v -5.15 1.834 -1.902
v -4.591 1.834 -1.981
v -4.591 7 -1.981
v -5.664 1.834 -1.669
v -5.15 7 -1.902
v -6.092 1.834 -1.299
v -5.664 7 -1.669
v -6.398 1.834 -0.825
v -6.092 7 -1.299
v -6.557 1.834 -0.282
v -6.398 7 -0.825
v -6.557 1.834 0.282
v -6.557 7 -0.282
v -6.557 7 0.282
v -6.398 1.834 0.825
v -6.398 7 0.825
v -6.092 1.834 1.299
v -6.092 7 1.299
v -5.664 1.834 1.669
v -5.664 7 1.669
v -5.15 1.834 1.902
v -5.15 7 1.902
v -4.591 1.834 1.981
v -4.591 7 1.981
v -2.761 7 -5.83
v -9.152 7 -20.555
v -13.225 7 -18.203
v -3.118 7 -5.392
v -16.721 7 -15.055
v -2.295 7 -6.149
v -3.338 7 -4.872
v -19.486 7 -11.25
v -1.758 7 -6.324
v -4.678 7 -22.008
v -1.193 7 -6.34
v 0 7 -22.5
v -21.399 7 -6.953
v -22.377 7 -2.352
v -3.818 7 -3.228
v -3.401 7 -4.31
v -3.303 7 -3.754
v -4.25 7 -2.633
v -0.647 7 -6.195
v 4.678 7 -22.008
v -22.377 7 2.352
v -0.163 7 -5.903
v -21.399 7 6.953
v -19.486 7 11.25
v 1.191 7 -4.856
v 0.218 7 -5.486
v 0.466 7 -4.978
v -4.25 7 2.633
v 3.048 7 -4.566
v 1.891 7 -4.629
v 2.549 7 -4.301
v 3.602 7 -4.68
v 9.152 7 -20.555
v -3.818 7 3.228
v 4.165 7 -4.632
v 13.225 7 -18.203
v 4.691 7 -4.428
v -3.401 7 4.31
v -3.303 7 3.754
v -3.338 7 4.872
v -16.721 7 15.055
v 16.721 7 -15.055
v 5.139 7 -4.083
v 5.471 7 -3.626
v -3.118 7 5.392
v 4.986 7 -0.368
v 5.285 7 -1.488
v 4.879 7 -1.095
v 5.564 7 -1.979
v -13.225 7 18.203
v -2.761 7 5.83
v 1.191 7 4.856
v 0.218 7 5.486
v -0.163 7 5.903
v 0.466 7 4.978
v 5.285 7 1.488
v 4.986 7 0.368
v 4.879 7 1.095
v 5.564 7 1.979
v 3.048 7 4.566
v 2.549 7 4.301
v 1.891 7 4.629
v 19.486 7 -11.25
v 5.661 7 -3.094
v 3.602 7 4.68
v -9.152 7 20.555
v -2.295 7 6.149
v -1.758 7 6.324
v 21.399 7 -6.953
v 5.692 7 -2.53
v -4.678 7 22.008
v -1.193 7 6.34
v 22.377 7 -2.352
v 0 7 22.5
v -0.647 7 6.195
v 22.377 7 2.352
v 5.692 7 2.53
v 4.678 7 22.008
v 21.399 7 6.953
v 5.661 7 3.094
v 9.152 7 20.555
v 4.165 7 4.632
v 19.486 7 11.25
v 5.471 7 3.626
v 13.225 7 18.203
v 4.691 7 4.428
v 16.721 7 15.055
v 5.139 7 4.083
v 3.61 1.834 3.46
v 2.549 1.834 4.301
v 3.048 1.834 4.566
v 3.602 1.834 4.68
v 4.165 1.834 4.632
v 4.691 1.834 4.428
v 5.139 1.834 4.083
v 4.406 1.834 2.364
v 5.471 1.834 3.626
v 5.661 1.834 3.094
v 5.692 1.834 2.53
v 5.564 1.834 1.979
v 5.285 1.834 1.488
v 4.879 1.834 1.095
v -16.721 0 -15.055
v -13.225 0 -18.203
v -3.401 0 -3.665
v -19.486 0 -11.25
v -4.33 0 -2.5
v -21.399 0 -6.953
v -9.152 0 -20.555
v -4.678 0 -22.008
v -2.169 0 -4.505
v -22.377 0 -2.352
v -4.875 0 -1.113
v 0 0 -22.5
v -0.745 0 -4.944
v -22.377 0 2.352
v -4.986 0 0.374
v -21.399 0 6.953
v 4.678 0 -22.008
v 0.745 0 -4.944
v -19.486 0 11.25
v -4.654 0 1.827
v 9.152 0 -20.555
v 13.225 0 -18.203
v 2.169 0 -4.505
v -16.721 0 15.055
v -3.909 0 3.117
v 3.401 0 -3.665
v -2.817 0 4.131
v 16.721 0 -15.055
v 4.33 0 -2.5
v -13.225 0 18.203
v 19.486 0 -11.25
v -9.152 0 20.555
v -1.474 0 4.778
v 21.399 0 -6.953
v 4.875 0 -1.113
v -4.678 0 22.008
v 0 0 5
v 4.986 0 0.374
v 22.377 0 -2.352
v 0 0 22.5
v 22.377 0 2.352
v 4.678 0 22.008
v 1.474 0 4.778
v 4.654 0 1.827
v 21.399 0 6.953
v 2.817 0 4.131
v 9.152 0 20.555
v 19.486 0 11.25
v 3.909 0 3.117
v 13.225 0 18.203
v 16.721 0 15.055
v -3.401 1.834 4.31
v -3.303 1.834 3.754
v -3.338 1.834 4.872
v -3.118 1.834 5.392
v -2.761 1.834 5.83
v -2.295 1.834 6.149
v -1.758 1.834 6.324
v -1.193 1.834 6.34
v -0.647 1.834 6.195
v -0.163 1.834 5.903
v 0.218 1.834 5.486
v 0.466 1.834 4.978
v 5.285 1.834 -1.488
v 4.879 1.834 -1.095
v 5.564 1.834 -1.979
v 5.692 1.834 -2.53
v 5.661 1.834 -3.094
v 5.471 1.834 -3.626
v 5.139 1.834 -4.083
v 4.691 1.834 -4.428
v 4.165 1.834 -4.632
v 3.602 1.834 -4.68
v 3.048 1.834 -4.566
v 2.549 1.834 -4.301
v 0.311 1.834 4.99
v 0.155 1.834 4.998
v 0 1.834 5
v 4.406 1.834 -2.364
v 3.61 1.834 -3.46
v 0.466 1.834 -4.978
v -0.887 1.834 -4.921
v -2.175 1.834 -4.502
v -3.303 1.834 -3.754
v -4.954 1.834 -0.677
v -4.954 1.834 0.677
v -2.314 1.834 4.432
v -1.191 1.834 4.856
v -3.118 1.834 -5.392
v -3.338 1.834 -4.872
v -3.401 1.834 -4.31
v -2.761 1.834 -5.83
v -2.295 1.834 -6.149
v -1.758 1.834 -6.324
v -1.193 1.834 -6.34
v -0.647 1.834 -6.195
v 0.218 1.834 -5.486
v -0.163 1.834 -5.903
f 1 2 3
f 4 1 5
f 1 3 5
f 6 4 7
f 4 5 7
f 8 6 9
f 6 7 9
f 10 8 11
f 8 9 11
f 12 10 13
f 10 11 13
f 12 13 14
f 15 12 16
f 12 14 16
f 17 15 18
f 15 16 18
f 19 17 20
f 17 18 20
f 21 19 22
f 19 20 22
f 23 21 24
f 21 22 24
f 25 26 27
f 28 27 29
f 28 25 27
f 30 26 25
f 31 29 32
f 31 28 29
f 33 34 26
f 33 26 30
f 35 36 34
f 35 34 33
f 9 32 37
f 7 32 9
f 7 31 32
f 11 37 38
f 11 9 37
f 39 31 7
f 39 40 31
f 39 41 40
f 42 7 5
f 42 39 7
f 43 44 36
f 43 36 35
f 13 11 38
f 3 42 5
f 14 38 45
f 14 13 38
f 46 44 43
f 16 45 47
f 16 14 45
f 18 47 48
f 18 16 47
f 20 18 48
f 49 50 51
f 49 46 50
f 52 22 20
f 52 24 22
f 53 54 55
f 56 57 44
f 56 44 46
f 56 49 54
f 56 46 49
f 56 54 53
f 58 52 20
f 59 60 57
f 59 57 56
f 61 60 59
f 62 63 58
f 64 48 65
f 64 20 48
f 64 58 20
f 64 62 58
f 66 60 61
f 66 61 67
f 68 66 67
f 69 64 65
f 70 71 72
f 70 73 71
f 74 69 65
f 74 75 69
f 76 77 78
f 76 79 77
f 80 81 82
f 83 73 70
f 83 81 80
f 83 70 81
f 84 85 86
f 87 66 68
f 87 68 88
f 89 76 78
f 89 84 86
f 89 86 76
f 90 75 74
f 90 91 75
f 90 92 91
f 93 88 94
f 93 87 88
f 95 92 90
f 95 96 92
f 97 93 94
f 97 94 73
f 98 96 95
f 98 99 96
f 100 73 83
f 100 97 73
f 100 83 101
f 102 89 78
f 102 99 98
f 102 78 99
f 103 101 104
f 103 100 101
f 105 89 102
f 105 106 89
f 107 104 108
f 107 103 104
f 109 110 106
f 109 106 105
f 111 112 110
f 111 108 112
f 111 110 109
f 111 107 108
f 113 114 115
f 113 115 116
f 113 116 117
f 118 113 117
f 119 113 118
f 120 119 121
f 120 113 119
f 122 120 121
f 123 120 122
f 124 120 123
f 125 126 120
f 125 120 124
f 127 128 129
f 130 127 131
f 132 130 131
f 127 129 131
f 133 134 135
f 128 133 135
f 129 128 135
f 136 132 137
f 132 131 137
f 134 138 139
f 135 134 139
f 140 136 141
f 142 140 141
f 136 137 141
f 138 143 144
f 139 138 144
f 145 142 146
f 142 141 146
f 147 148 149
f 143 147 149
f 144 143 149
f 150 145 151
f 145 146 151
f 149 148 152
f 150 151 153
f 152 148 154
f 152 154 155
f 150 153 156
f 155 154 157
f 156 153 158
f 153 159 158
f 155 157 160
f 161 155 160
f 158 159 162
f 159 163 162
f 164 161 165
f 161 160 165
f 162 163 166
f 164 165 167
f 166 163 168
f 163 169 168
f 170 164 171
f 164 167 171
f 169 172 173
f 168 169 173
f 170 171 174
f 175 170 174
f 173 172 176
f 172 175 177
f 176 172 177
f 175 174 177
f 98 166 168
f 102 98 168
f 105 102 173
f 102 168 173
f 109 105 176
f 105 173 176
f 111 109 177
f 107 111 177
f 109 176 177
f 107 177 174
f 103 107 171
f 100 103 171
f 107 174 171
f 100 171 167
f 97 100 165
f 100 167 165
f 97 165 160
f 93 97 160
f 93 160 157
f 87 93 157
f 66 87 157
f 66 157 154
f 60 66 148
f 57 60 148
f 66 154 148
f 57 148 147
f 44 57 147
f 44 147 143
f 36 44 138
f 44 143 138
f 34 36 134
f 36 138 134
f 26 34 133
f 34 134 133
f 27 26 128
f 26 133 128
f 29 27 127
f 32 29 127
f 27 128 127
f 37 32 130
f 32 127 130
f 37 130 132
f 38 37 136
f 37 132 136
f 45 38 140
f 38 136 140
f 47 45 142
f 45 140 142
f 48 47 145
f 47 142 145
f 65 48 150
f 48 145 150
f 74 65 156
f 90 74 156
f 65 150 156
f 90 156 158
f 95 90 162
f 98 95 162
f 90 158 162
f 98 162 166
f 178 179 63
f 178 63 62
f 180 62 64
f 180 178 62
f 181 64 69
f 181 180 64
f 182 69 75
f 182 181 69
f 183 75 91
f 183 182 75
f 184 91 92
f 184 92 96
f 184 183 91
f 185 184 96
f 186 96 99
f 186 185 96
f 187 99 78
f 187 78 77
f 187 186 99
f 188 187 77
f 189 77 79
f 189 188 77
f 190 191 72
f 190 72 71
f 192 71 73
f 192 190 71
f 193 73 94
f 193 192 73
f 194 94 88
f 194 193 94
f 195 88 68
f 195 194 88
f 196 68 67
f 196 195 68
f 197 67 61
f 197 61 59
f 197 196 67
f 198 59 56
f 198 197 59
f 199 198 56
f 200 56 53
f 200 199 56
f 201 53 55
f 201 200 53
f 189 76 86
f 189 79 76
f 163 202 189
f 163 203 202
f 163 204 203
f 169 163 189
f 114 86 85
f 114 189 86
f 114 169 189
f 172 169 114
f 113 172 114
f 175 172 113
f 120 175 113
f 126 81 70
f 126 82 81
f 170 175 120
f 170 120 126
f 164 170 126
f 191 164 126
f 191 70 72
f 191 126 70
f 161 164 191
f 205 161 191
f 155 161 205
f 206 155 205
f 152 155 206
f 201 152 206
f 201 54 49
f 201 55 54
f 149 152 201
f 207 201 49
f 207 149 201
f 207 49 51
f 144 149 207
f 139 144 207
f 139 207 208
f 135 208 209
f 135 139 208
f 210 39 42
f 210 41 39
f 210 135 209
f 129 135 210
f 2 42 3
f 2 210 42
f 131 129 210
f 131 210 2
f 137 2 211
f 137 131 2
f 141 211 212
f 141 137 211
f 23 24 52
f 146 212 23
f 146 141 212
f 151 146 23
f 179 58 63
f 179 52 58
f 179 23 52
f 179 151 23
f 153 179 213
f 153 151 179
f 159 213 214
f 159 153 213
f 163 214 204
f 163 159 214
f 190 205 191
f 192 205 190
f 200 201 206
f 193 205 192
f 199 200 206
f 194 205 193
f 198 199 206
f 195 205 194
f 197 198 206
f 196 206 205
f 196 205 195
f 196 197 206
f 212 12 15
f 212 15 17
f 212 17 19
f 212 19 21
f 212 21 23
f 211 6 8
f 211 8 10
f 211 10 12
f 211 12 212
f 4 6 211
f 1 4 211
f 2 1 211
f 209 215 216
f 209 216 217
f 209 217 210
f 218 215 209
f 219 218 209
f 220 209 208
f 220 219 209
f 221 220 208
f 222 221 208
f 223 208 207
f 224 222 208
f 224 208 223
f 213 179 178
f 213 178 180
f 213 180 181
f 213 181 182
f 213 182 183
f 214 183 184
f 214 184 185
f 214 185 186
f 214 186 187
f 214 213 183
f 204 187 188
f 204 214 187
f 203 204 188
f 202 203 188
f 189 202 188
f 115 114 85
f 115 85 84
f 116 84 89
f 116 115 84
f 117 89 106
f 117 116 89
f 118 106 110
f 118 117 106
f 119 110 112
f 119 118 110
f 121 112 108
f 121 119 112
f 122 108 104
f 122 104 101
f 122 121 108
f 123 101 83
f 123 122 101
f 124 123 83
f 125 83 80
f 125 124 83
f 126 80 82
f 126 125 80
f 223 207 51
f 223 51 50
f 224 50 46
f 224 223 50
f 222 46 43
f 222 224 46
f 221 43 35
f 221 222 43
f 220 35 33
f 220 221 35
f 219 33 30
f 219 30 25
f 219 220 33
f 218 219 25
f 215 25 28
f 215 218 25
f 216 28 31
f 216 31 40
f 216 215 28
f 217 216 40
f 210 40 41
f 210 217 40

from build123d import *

# Parameters (mm, degrees)
SKETCH1_R           = 22.5
BOSS_EXTRUDE1_DEPTH = 7
SKETCH2_R           = 5
CUT_EXTRUDE1_DEPTH  = 33.580669115
SKETCH3_R           = 1.981426301
CUT_EXTRUDE2_DEPTH  = 5.165945731
CIRPATTERN1_COUNT   = 5


with BuildPart() as part:
    # Sketch1 → Boss-Extrude1 (new body)
    with BuildSketch(Plane(origin=(0, 0, 0), x_dir=(1, 0, 0), z_dir=(0, 1, 0))):
        Circle(SKETCH1_R)
    extrude(amount=BOSS_EXTRUDE1_DEPTH)

    # Sketch2 → Cut-Extrude1 (cut, through all)
    with BuildSketch(Plane(origin=(0, 0, 0), x_dir=(1, 0, 0), z_dir=(0, 1, 0))):
        Circle(SKETCH2_R)
    extrude(amount=CUT_EXTRUDE1_DEPTH, mode=Mode.SUBTRACT)

    # Sketch3 → Cut-Extrude2 (cut)
    with BuildSketch(Plane(origin=(0, 7, 0), x_dir=(1, 0, 0), z_dir=(0, 1, 0))):
        with Locations((-4.596235577, 0)):
            Circle(SKETCH3_R)
    cut_extrude2 = extrude(amount=-CUT_EXTRUDE2_DEPTH, mode=Mode.SUBTRACT)

    # CirPattern1: Cut-Extrude2 ×5 about axis
    cirpattern1_axis = Axis((0, 0, 0), (0, 1, 0))
    for i in range(1, CIRPATTERN1_COUNT):
        add(cut_extrude2.rotate(cirpattern1_axis, i * 360 / CIRPATTERN1_COUNT), mode=Mode.SUBTRACT)


solid = part.part
